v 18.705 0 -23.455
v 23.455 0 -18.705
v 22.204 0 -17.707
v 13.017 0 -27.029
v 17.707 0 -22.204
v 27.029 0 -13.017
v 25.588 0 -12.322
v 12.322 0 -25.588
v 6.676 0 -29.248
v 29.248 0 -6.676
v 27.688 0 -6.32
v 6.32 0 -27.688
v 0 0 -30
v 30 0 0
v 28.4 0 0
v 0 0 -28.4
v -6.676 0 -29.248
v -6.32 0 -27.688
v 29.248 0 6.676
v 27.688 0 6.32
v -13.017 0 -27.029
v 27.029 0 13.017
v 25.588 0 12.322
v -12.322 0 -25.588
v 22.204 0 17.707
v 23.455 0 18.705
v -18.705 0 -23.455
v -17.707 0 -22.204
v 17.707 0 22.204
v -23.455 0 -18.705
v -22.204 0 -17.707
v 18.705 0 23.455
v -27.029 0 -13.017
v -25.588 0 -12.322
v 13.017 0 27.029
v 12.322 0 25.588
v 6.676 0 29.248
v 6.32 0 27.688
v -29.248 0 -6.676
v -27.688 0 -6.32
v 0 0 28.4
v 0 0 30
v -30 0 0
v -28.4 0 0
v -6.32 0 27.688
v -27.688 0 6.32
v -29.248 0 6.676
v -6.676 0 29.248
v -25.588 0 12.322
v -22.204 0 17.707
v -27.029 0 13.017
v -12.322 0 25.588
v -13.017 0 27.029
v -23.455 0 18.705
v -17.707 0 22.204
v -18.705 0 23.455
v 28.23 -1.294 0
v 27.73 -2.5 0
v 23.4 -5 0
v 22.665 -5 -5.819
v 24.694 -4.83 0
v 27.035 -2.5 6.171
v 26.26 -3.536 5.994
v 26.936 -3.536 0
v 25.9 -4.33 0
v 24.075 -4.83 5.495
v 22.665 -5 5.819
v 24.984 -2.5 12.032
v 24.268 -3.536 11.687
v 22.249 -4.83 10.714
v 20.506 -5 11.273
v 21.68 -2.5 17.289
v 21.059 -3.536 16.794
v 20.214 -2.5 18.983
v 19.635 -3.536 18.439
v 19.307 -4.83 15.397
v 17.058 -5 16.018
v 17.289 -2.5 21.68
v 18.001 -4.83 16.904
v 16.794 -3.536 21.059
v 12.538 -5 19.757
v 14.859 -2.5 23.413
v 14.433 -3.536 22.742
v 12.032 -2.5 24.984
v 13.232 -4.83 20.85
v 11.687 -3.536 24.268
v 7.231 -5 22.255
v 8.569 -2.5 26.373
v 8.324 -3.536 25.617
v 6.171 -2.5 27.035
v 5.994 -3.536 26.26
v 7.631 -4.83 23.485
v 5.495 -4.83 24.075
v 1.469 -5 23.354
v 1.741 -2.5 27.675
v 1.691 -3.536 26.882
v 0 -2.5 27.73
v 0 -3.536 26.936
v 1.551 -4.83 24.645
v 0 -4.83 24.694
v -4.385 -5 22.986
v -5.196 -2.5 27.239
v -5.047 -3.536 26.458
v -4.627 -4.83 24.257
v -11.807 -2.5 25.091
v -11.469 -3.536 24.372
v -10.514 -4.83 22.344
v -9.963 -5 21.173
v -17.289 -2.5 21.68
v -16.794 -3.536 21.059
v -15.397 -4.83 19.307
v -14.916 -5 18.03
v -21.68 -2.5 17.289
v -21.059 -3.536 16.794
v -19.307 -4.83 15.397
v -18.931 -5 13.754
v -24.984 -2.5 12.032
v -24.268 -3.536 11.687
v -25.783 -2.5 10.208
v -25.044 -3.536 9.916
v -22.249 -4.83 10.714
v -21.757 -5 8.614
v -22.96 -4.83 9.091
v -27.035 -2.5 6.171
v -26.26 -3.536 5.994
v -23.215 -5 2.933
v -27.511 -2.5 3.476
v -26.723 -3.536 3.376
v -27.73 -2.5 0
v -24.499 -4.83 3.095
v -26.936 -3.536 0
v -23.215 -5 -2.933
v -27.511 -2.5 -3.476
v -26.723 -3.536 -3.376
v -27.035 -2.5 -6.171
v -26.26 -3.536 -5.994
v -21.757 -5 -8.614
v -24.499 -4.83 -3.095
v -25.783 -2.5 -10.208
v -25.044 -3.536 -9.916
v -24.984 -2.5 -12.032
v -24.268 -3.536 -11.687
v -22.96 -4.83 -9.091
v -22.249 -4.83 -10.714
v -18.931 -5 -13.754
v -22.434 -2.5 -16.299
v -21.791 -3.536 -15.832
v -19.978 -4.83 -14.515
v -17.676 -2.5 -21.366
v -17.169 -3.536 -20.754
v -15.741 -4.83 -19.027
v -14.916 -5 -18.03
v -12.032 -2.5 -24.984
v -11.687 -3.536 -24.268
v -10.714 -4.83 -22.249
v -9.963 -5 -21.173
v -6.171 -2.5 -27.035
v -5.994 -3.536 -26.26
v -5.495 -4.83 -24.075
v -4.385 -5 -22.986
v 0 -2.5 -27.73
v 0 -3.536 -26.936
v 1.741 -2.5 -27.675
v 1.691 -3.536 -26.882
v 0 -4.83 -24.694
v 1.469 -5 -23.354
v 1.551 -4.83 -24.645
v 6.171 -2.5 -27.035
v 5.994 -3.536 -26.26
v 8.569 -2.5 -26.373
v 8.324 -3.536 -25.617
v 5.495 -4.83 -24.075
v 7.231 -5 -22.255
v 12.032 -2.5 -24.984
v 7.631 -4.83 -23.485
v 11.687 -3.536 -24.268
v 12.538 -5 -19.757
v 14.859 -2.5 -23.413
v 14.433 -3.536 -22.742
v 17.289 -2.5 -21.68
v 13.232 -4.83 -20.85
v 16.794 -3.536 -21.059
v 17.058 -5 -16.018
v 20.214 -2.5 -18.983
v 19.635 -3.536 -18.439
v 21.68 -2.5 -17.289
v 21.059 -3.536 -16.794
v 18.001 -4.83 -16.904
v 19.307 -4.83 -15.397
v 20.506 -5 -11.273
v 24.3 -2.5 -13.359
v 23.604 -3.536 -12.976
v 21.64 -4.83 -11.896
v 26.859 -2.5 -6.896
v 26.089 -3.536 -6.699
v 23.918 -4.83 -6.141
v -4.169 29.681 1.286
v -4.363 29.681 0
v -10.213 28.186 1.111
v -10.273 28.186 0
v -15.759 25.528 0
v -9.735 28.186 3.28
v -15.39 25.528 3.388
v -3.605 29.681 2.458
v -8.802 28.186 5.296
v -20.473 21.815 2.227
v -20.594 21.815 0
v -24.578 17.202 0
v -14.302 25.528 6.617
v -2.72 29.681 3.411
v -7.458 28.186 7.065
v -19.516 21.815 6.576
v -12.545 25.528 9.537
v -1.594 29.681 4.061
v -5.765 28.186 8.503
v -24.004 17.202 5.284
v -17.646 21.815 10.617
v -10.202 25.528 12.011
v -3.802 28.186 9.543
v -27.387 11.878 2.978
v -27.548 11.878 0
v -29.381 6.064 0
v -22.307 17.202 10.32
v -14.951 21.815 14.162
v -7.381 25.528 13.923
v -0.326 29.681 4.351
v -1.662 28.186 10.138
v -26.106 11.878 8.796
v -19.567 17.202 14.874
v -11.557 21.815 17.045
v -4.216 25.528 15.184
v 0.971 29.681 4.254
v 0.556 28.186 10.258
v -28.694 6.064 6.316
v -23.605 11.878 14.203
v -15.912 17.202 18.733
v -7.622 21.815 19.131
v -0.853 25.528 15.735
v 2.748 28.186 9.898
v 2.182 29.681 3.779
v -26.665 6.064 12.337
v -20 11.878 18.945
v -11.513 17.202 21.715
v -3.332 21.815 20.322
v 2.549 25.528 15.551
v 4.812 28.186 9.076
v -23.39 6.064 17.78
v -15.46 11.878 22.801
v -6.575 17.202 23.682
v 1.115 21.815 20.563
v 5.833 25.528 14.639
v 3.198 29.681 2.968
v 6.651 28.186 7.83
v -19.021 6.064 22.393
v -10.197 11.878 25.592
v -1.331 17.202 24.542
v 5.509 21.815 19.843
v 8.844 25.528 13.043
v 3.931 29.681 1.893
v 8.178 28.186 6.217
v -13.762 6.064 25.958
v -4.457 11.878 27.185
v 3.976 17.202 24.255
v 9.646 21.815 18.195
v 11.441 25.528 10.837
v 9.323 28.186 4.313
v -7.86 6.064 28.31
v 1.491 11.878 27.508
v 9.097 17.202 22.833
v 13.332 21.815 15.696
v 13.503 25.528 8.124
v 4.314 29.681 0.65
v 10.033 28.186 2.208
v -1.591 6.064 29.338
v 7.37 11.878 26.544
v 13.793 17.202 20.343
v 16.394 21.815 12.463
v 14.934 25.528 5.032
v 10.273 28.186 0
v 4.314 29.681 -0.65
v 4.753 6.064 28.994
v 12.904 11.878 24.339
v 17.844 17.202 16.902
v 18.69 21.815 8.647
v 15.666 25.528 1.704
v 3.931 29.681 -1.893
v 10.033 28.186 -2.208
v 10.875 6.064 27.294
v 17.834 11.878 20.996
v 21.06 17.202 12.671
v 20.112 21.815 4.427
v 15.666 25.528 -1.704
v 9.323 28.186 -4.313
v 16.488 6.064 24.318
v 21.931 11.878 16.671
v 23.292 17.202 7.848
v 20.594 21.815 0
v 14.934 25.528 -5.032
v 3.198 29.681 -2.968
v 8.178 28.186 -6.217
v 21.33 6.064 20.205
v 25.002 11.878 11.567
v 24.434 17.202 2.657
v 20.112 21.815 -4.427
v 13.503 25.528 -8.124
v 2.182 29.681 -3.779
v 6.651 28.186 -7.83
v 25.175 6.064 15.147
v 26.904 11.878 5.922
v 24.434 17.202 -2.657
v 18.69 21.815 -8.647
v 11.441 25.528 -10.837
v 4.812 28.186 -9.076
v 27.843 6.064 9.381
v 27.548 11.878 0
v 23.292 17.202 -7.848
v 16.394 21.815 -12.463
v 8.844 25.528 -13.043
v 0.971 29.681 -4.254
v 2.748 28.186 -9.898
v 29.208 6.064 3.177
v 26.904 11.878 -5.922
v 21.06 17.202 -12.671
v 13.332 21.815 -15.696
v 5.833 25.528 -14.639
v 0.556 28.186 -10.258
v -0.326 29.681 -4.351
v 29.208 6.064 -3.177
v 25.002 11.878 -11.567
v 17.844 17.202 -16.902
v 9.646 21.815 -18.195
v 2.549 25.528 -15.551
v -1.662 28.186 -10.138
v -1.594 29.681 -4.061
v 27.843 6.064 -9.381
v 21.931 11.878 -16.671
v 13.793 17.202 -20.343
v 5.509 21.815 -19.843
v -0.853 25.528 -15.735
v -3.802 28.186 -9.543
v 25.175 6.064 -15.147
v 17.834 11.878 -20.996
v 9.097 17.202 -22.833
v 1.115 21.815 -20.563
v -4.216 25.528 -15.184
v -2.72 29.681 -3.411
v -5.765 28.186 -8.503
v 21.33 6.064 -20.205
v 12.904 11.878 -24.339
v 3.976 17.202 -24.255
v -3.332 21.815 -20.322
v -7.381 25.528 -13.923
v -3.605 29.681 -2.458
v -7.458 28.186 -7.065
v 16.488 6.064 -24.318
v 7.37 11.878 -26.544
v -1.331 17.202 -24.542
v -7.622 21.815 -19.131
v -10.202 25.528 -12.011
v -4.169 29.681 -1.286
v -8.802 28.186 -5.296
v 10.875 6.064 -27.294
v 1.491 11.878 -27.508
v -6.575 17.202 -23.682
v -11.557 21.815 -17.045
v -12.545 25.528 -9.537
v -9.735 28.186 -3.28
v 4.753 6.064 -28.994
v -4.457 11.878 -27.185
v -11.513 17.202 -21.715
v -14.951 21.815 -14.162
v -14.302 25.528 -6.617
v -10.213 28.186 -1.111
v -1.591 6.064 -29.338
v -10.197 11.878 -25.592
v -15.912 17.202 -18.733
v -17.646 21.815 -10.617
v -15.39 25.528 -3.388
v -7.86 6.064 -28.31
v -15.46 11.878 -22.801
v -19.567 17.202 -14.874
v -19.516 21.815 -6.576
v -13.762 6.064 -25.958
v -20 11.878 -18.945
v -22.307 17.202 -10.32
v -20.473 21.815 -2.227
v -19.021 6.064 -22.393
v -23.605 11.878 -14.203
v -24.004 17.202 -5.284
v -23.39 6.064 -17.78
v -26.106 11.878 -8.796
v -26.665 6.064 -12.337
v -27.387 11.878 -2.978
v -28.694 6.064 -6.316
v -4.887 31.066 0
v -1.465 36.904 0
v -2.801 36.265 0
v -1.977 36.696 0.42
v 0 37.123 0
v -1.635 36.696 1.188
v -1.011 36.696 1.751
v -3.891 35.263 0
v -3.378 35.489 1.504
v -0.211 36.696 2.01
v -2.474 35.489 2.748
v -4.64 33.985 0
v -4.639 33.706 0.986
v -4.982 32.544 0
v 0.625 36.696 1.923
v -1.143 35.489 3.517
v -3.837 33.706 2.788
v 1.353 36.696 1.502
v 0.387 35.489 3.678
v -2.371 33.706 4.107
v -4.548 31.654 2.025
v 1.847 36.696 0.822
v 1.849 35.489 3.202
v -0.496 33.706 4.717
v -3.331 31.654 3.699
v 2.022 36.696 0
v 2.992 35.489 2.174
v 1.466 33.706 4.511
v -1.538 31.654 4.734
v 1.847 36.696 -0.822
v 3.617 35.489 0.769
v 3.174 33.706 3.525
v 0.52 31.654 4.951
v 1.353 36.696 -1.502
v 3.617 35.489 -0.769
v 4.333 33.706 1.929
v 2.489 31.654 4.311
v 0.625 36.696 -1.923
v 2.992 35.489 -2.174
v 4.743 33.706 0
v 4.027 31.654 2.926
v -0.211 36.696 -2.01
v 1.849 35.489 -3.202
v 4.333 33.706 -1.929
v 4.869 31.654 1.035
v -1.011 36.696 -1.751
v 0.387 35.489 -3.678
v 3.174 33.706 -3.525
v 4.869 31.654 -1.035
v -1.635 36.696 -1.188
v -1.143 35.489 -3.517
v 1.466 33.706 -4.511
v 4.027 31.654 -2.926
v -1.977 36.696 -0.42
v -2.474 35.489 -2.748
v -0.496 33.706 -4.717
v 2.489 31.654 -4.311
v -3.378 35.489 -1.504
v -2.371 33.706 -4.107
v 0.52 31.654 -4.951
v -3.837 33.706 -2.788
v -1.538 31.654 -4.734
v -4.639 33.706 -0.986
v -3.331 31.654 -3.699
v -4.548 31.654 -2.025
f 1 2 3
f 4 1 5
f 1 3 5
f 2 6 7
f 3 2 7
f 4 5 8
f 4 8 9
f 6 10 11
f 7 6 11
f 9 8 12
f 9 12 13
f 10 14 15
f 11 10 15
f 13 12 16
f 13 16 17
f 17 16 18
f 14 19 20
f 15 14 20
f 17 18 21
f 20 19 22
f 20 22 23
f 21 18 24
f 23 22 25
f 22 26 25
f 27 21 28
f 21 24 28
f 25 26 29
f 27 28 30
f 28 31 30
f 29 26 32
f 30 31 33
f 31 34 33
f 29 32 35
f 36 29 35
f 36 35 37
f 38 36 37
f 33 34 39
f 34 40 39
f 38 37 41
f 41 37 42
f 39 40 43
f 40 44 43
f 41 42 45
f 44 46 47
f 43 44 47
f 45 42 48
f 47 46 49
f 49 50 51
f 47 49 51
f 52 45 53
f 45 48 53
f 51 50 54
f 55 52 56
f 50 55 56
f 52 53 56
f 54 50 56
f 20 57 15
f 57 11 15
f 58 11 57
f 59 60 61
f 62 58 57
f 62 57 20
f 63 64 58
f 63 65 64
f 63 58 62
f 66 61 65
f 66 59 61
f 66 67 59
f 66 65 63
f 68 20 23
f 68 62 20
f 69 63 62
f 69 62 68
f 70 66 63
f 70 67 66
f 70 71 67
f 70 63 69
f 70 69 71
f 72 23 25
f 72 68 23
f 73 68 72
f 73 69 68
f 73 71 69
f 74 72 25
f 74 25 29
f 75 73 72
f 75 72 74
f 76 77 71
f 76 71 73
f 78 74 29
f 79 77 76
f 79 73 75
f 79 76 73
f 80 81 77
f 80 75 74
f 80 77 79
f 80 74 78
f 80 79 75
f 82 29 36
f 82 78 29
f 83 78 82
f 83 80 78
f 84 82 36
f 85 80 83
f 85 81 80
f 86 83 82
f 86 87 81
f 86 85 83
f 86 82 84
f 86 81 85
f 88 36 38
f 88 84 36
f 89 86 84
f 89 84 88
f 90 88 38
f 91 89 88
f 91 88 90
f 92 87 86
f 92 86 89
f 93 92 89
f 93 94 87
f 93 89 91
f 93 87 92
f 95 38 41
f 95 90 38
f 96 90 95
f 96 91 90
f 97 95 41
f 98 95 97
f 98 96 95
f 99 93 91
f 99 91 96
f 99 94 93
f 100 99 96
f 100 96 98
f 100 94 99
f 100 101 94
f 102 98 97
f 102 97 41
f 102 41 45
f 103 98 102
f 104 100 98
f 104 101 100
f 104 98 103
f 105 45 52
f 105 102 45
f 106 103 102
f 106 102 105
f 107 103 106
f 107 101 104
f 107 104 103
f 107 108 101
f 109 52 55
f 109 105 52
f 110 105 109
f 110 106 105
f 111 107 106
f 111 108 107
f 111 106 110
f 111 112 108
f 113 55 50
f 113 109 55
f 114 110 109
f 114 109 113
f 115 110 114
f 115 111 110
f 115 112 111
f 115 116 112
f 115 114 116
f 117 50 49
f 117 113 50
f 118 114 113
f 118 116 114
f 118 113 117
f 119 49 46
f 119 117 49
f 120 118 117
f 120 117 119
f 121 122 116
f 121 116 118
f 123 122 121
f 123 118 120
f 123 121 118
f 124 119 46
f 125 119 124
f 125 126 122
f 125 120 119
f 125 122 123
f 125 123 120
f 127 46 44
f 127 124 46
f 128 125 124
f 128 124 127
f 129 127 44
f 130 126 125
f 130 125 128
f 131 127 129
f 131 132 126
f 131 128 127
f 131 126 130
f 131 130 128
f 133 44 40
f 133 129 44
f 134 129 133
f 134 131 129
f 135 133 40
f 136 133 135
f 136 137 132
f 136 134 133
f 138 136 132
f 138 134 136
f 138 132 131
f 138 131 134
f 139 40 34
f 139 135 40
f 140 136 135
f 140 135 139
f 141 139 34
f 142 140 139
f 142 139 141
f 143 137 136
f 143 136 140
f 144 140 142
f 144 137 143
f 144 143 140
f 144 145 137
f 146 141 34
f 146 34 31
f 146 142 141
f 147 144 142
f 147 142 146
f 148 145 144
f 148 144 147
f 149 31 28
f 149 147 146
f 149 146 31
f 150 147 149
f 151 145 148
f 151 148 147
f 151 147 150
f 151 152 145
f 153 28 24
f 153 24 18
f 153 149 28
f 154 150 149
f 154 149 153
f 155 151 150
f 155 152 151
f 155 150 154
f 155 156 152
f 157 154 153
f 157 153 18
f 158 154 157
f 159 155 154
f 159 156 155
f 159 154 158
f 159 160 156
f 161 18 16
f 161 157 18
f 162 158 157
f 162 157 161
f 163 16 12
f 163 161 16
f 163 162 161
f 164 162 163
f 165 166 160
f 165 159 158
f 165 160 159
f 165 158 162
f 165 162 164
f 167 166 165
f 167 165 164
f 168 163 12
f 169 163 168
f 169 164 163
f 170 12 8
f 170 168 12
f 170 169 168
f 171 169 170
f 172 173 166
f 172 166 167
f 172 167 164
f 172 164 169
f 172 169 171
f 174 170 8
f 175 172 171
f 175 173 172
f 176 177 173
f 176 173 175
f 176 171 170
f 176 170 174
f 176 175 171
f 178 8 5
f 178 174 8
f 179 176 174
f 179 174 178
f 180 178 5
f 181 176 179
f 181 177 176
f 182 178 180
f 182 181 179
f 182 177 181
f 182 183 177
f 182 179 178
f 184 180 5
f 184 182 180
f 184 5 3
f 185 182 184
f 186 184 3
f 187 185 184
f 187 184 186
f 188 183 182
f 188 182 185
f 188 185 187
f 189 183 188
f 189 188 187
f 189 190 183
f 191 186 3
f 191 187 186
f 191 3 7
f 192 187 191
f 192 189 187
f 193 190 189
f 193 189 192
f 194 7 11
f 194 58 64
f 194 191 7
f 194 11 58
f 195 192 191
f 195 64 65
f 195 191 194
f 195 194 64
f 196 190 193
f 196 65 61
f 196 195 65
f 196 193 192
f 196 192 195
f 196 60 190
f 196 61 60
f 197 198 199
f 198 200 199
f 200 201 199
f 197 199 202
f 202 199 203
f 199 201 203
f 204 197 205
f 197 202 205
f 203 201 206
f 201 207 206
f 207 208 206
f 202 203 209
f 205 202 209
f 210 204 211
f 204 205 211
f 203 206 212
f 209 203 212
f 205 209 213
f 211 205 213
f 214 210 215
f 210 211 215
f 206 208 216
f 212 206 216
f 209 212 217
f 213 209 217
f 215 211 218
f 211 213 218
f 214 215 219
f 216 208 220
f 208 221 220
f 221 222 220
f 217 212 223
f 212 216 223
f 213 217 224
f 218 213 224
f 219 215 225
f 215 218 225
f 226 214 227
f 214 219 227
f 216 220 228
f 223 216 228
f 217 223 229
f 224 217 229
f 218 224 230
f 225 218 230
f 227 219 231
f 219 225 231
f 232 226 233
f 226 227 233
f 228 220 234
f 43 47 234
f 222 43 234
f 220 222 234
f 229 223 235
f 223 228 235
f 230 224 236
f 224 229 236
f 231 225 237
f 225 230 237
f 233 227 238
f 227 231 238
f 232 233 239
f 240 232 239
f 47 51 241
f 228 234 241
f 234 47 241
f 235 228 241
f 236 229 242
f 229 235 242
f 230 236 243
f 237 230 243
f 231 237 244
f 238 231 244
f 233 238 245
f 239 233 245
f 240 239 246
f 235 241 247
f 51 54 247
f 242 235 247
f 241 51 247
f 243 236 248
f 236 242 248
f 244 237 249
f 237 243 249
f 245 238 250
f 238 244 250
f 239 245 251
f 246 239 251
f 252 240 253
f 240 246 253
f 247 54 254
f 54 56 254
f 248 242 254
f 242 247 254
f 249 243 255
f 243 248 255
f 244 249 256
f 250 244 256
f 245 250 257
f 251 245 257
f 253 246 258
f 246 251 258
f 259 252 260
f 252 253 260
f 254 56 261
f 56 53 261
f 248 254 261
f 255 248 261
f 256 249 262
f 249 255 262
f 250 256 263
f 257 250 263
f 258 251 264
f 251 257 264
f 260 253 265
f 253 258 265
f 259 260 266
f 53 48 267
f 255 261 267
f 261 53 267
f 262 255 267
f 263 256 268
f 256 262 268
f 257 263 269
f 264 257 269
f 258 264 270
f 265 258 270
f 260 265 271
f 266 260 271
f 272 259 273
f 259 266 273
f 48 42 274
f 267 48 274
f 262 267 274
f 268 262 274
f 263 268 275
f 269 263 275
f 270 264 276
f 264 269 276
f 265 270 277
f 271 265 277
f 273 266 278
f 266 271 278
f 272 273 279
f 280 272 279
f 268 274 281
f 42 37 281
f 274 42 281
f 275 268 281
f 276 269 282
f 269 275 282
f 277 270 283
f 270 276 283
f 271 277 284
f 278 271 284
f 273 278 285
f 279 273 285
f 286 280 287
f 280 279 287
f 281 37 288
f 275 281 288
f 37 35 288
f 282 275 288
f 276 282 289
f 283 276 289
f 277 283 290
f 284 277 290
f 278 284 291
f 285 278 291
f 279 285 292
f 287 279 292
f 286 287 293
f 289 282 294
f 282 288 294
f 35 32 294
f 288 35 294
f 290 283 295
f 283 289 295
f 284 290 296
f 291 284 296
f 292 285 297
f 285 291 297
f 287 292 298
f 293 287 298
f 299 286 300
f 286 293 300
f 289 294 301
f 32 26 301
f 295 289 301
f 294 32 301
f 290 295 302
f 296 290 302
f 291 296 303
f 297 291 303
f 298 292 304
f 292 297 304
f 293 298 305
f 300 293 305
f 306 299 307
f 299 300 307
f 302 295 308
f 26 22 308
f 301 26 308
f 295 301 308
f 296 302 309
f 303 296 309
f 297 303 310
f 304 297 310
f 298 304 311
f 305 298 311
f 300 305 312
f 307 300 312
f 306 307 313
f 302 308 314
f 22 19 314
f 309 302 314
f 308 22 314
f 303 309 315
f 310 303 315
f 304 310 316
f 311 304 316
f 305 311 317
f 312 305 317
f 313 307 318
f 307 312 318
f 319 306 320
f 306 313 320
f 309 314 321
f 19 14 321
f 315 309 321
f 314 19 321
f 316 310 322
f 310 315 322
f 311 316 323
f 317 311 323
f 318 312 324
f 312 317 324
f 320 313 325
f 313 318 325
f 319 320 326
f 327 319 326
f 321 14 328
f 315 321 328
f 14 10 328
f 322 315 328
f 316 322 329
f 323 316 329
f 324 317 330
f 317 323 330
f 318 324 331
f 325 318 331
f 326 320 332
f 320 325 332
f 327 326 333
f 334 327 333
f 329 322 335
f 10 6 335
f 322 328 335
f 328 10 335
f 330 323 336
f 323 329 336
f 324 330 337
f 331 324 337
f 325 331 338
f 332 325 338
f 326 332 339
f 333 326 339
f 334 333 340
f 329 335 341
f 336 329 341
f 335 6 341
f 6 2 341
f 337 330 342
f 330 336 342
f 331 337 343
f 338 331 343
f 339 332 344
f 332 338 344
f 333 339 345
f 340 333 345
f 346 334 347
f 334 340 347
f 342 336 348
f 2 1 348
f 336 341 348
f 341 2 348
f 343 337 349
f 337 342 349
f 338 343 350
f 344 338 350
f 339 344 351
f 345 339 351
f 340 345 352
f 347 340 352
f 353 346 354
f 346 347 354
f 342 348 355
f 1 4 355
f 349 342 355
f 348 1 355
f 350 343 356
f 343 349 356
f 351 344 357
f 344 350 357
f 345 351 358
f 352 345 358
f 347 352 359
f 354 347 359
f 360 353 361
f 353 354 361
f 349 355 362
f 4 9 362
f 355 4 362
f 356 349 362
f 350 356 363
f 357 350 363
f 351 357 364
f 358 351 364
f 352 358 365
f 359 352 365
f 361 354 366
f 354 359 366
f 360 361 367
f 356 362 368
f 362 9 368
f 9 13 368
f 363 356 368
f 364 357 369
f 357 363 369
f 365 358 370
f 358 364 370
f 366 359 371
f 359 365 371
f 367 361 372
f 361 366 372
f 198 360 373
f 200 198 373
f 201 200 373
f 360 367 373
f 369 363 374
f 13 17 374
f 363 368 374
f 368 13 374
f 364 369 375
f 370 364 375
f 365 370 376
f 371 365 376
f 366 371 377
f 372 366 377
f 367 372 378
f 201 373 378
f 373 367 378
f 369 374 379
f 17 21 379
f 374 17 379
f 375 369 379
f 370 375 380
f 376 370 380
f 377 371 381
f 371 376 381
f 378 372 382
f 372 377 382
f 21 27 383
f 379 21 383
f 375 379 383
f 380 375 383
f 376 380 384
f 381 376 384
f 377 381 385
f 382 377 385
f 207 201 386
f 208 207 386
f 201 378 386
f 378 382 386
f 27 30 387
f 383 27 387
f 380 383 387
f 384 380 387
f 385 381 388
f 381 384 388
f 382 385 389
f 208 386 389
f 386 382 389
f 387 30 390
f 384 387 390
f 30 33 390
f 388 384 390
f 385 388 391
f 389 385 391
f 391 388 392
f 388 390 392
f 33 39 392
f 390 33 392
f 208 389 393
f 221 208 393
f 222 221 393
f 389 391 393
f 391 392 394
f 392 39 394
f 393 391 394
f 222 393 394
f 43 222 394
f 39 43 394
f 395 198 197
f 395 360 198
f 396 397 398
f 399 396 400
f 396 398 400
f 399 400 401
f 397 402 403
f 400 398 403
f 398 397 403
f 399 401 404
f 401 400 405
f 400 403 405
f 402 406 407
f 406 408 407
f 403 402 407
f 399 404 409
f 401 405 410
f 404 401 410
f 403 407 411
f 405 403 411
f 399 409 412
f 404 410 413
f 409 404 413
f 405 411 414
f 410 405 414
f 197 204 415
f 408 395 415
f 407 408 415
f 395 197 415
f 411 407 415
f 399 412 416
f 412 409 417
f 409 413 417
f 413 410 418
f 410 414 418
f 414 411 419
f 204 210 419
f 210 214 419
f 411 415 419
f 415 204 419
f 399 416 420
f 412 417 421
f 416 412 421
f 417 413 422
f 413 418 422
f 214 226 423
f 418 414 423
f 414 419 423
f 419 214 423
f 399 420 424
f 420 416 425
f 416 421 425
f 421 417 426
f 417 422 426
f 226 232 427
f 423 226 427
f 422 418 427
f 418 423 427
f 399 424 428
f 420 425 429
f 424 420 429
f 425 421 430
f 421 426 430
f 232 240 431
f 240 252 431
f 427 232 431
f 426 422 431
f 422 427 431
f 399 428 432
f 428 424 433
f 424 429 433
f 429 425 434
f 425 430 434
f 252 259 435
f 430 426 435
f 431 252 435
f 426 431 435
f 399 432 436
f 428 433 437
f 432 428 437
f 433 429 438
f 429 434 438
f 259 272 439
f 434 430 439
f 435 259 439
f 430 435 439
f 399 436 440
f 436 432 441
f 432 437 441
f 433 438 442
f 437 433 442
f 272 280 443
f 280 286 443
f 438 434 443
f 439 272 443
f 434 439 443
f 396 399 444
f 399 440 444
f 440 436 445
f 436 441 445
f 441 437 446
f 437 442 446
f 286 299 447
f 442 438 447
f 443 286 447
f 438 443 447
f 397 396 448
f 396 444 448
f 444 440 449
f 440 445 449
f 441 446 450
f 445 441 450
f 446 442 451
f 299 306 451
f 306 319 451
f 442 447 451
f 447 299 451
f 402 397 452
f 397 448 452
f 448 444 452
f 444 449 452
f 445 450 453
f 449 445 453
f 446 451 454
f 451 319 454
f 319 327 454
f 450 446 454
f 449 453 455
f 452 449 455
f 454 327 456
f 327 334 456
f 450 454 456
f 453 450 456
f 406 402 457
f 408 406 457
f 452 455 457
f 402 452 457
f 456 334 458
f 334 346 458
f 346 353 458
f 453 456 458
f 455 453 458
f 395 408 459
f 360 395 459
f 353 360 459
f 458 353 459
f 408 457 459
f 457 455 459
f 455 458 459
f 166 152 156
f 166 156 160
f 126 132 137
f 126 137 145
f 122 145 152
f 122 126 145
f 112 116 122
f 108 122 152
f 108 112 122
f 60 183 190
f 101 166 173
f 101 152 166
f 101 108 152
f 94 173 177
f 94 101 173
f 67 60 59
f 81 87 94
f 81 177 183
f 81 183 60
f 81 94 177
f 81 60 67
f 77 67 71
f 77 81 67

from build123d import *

# Parameters (mm, degrees)
F2_R     = 28.4
F3_DEPTH = 5
F4_R     = 4.99999


# Not quite as in the source:
# - a fillet or chamfer is up to 0.001 mm smaller than in the source, because OpenCascade refuses the exact size


with BuildPart() as f1:
    # F0 (on Top) → F1 (revolve)
    with BuildSketch(Plane.XY):
        with BuildLine():
            ThreePointArc((0, 37.1231260896), (-4.3133778971, 34.6519145578), (-4.3630481141, 29.6810345364))
            ThreePointArc((-4.3630481141, 29.6810345364), (-22.7034297346, 19.6100555402), (-30, 0))
            Line((-30, 0), (0, 0))
            Line((0, 0), (0, 27.1231260896))
            Line((0, 27.1231260896), (0, 30))
            Line((0, 30), (0, 37.1231260896))
        make_face()
    revolve(axis=Axis((0, 15, 0), (0, 1, 0)))

    # F2 (on Front) → F3 (join)
    with BuildSketch(Plane.XZ):
        Circle(F2_R)
    extrude(amount=F3_DEPTH)

    # F4 (radius 5 in the source; OpenCascade refuses exactly that, so slightly less here)
    f4_edges = [f1.edges().sort_by_distance(p)[0] for p in [
        (-28.4, -5, 0),
    ]]
    fillet(f4_edges, radius=F4_R)


solid = f1.part
